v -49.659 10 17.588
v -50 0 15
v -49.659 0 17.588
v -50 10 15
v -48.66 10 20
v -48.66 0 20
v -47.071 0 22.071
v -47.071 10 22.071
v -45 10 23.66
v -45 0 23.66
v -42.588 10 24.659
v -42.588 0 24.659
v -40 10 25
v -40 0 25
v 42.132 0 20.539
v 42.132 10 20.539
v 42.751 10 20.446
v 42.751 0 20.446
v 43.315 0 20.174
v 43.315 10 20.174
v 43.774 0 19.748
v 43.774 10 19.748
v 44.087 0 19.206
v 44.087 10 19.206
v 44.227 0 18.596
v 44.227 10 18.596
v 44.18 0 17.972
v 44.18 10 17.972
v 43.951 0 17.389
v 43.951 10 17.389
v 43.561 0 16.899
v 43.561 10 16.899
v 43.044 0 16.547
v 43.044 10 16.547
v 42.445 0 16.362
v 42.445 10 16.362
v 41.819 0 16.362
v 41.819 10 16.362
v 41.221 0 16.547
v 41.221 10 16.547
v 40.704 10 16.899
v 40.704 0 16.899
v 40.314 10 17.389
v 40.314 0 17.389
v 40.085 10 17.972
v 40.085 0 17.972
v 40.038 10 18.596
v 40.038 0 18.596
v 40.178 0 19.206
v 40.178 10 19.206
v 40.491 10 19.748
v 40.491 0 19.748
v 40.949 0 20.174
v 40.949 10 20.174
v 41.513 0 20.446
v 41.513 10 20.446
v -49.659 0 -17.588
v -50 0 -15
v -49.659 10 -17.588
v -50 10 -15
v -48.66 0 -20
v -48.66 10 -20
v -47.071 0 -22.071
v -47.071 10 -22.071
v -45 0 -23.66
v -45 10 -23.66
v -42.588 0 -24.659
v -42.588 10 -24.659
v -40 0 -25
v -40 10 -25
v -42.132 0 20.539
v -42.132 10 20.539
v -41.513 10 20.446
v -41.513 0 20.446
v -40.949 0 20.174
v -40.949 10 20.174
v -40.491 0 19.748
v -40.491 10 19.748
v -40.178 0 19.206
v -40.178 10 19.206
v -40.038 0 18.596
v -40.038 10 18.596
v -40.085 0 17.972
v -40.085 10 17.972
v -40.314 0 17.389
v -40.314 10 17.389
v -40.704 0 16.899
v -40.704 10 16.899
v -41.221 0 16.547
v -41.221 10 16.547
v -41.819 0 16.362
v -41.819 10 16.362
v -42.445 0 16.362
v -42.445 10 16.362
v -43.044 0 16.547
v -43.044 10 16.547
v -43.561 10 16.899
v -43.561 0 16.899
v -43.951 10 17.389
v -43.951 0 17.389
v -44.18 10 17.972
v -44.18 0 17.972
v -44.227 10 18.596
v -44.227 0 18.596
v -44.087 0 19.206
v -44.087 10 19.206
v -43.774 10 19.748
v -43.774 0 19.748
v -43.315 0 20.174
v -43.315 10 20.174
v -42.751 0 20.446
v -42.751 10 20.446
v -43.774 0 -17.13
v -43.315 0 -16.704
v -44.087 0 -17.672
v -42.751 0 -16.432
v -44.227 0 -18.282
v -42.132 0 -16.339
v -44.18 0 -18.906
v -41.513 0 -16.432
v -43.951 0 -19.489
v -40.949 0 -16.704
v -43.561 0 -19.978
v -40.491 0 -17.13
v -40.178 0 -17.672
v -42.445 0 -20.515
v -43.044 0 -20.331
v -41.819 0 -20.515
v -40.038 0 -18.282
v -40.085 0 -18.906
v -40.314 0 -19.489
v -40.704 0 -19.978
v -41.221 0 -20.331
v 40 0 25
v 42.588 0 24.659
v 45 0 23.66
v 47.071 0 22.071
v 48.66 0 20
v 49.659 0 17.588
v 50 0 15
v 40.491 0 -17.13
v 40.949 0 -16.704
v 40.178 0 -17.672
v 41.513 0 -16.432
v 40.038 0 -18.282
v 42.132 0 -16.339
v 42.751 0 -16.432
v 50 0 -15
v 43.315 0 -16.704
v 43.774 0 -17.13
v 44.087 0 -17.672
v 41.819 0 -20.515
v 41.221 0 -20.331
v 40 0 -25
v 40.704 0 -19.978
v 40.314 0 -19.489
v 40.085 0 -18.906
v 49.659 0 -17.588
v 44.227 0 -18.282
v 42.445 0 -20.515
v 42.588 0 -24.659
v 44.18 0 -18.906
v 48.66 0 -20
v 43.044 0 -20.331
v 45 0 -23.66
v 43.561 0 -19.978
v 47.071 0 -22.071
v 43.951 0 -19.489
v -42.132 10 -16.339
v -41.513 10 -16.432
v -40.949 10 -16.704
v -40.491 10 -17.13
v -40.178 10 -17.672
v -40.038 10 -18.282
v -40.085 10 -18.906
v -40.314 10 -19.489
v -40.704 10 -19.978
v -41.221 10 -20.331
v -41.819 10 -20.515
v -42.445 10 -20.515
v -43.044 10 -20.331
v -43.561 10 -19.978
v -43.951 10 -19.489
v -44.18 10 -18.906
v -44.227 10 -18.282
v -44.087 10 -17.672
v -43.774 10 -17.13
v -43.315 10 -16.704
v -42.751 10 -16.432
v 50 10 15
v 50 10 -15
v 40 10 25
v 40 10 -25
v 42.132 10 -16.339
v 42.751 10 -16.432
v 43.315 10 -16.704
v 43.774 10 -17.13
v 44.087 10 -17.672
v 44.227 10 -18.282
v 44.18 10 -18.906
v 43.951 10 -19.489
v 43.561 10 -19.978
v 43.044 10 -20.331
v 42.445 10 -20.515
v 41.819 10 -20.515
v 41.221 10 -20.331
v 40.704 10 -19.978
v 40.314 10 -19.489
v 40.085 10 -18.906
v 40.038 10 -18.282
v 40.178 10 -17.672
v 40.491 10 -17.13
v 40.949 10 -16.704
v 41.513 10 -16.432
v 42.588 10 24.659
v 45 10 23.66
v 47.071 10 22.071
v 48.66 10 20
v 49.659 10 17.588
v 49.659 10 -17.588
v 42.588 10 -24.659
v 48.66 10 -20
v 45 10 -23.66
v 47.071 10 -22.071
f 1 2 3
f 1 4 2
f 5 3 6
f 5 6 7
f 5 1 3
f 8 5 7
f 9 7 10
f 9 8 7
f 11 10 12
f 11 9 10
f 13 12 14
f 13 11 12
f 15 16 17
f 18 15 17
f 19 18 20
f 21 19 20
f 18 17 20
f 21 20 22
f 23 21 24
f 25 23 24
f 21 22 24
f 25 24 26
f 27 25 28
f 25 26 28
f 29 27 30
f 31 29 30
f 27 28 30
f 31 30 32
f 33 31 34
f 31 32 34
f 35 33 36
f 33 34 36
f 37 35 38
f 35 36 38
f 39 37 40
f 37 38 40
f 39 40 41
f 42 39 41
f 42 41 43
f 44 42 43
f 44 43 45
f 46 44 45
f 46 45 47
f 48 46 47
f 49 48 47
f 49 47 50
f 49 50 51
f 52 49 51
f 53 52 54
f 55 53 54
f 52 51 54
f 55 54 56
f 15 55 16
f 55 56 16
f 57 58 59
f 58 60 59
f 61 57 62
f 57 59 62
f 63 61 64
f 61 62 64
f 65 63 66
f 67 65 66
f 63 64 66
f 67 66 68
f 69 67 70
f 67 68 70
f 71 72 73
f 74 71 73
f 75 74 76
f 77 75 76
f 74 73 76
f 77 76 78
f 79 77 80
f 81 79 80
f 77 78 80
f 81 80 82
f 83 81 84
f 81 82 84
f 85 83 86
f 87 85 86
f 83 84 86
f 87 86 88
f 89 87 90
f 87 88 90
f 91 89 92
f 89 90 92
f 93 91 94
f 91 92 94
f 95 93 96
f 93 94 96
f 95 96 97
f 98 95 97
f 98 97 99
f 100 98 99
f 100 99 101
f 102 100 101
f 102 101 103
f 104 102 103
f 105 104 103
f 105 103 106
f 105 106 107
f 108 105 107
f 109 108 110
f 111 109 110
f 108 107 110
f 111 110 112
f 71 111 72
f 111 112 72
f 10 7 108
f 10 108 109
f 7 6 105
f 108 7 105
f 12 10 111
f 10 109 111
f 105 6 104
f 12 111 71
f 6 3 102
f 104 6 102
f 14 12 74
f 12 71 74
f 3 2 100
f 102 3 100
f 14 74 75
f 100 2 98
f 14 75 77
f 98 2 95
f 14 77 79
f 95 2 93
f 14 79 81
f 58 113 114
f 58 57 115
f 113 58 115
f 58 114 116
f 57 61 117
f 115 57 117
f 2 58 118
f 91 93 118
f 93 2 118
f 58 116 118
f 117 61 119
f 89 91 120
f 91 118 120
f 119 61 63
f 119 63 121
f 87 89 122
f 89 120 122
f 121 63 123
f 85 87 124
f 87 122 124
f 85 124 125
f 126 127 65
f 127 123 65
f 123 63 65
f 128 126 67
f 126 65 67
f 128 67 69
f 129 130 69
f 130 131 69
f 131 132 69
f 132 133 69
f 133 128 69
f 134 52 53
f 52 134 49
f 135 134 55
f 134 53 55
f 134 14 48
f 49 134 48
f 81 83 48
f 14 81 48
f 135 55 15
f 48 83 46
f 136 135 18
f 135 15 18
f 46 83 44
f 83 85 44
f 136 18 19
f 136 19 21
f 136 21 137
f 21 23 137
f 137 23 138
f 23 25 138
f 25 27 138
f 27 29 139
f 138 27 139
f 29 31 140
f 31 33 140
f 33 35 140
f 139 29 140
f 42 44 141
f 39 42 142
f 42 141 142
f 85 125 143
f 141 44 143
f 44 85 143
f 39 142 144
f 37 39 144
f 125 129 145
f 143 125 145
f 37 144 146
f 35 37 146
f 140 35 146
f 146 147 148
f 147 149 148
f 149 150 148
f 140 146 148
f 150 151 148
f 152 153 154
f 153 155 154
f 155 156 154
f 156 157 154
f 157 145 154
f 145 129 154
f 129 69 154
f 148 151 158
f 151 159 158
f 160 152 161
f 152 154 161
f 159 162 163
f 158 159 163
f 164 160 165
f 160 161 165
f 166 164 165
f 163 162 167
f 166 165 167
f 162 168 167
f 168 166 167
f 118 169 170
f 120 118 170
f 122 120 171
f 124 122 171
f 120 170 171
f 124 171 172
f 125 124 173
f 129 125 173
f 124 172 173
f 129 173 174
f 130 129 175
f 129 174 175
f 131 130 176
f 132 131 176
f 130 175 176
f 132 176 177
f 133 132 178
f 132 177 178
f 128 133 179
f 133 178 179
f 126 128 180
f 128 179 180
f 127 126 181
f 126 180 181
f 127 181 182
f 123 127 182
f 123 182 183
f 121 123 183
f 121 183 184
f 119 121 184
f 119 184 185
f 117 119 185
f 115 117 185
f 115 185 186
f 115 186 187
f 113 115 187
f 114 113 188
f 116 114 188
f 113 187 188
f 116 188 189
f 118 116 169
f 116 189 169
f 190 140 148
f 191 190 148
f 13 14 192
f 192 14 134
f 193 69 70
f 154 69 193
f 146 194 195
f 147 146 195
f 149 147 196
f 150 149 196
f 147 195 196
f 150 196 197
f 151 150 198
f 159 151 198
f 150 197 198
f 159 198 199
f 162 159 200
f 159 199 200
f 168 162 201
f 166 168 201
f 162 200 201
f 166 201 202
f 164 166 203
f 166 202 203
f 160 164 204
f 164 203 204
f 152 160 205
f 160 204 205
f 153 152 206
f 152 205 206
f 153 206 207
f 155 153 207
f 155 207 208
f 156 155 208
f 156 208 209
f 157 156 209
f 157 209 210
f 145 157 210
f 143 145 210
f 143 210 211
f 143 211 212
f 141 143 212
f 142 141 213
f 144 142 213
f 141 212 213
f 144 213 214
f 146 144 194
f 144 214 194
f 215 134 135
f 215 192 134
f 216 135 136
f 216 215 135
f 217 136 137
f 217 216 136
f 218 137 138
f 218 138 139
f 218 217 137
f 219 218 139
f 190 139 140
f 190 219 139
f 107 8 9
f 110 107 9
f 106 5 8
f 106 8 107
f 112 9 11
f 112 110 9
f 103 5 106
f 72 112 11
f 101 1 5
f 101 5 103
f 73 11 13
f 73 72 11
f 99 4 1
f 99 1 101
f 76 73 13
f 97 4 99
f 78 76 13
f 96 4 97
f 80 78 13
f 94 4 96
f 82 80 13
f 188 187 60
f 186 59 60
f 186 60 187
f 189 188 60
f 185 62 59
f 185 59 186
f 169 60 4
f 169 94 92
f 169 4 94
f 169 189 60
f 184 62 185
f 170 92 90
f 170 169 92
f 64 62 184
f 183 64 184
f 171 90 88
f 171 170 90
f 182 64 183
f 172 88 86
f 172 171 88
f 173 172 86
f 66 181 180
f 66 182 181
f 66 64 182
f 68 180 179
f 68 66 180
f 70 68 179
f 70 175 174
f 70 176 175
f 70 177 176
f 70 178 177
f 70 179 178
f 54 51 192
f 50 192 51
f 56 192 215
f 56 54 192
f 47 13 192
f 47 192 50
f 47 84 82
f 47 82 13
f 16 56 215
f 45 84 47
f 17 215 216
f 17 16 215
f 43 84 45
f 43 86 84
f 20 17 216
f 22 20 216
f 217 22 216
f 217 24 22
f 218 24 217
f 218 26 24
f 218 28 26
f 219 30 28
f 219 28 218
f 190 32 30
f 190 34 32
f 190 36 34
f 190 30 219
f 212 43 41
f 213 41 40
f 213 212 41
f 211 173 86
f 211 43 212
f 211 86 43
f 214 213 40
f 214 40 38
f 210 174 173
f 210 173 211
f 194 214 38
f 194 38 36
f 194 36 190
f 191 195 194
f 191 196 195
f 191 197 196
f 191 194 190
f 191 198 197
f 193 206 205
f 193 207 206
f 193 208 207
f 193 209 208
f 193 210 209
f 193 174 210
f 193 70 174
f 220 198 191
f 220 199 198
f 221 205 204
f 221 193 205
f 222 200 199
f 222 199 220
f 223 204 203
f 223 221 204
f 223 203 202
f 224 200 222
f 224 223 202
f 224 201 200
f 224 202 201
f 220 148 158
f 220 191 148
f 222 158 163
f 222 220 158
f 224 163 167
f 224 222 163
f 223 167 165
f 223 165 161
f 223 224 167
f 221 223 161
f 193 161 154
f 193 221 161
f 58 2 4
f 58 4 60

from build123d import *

# Parameters (mm, degrees)
SKETCH1_W           = 100
SKETCH1_H           = 50
BOSS_EXTRUDE1_DEPTH = 10
FILLET1_R           = 10
SKETCH2_R           = 2.1
CUT_EXTRUDE1_DEPTH  = 10


with BuildPart() as part:
    # Sketch1 → Boss-Extrude1 (new body)
    with BuildSketch(Plane(origin=(0, 0, 0), x_dir=(1, 0, 0), z_dir=(0, 1, 0))):
        Rectangle(SKETCH1_W, SKETCH1_H)
    extrude(amount=BOSS_EXTRUDE1_DEPTH)

    # Fillet1
    fillet1_edges = [part.edges().sort_by_distance(p)[0] for p in [
        (-50, 5, -25),
        (50, 5, -25),
        (50, 5, 25),
        (-50, 5, 25),
    ]]
    fillet(fillet1_edges, radius=FILLET1_R)

    # Sketch2 → Cut-Extrude1 (cut)
    with BuildSketch(Plane(origin=(0, 10, 0), x_dir=(1, 0, 0), z_dir=(0, 1, 0))):
        with Locations(Location((-42.132384366, 18.438889303, 0), (0, 0, 270))):
            Circle(SKETCH2_R)
        with Locations(Location((42.132384366, 18.438889303, 0), (0, 0, 270))):
            Circle(SKETCH2_R)
        with Locations(Location((42.132384366, -18.438889303, 0), (0, 0, 270))):
            Circle(SKETCH2_R)
        with Locations(Location((-42.132384366, -18.438889303, 0), (0, 0, 270))):
            Circle(SKETCH2_R)
    extrude(amount=-CUT_EXTRUDE1_DEPTH, mode=Mode.SUBTRACT)


solid = part.part
